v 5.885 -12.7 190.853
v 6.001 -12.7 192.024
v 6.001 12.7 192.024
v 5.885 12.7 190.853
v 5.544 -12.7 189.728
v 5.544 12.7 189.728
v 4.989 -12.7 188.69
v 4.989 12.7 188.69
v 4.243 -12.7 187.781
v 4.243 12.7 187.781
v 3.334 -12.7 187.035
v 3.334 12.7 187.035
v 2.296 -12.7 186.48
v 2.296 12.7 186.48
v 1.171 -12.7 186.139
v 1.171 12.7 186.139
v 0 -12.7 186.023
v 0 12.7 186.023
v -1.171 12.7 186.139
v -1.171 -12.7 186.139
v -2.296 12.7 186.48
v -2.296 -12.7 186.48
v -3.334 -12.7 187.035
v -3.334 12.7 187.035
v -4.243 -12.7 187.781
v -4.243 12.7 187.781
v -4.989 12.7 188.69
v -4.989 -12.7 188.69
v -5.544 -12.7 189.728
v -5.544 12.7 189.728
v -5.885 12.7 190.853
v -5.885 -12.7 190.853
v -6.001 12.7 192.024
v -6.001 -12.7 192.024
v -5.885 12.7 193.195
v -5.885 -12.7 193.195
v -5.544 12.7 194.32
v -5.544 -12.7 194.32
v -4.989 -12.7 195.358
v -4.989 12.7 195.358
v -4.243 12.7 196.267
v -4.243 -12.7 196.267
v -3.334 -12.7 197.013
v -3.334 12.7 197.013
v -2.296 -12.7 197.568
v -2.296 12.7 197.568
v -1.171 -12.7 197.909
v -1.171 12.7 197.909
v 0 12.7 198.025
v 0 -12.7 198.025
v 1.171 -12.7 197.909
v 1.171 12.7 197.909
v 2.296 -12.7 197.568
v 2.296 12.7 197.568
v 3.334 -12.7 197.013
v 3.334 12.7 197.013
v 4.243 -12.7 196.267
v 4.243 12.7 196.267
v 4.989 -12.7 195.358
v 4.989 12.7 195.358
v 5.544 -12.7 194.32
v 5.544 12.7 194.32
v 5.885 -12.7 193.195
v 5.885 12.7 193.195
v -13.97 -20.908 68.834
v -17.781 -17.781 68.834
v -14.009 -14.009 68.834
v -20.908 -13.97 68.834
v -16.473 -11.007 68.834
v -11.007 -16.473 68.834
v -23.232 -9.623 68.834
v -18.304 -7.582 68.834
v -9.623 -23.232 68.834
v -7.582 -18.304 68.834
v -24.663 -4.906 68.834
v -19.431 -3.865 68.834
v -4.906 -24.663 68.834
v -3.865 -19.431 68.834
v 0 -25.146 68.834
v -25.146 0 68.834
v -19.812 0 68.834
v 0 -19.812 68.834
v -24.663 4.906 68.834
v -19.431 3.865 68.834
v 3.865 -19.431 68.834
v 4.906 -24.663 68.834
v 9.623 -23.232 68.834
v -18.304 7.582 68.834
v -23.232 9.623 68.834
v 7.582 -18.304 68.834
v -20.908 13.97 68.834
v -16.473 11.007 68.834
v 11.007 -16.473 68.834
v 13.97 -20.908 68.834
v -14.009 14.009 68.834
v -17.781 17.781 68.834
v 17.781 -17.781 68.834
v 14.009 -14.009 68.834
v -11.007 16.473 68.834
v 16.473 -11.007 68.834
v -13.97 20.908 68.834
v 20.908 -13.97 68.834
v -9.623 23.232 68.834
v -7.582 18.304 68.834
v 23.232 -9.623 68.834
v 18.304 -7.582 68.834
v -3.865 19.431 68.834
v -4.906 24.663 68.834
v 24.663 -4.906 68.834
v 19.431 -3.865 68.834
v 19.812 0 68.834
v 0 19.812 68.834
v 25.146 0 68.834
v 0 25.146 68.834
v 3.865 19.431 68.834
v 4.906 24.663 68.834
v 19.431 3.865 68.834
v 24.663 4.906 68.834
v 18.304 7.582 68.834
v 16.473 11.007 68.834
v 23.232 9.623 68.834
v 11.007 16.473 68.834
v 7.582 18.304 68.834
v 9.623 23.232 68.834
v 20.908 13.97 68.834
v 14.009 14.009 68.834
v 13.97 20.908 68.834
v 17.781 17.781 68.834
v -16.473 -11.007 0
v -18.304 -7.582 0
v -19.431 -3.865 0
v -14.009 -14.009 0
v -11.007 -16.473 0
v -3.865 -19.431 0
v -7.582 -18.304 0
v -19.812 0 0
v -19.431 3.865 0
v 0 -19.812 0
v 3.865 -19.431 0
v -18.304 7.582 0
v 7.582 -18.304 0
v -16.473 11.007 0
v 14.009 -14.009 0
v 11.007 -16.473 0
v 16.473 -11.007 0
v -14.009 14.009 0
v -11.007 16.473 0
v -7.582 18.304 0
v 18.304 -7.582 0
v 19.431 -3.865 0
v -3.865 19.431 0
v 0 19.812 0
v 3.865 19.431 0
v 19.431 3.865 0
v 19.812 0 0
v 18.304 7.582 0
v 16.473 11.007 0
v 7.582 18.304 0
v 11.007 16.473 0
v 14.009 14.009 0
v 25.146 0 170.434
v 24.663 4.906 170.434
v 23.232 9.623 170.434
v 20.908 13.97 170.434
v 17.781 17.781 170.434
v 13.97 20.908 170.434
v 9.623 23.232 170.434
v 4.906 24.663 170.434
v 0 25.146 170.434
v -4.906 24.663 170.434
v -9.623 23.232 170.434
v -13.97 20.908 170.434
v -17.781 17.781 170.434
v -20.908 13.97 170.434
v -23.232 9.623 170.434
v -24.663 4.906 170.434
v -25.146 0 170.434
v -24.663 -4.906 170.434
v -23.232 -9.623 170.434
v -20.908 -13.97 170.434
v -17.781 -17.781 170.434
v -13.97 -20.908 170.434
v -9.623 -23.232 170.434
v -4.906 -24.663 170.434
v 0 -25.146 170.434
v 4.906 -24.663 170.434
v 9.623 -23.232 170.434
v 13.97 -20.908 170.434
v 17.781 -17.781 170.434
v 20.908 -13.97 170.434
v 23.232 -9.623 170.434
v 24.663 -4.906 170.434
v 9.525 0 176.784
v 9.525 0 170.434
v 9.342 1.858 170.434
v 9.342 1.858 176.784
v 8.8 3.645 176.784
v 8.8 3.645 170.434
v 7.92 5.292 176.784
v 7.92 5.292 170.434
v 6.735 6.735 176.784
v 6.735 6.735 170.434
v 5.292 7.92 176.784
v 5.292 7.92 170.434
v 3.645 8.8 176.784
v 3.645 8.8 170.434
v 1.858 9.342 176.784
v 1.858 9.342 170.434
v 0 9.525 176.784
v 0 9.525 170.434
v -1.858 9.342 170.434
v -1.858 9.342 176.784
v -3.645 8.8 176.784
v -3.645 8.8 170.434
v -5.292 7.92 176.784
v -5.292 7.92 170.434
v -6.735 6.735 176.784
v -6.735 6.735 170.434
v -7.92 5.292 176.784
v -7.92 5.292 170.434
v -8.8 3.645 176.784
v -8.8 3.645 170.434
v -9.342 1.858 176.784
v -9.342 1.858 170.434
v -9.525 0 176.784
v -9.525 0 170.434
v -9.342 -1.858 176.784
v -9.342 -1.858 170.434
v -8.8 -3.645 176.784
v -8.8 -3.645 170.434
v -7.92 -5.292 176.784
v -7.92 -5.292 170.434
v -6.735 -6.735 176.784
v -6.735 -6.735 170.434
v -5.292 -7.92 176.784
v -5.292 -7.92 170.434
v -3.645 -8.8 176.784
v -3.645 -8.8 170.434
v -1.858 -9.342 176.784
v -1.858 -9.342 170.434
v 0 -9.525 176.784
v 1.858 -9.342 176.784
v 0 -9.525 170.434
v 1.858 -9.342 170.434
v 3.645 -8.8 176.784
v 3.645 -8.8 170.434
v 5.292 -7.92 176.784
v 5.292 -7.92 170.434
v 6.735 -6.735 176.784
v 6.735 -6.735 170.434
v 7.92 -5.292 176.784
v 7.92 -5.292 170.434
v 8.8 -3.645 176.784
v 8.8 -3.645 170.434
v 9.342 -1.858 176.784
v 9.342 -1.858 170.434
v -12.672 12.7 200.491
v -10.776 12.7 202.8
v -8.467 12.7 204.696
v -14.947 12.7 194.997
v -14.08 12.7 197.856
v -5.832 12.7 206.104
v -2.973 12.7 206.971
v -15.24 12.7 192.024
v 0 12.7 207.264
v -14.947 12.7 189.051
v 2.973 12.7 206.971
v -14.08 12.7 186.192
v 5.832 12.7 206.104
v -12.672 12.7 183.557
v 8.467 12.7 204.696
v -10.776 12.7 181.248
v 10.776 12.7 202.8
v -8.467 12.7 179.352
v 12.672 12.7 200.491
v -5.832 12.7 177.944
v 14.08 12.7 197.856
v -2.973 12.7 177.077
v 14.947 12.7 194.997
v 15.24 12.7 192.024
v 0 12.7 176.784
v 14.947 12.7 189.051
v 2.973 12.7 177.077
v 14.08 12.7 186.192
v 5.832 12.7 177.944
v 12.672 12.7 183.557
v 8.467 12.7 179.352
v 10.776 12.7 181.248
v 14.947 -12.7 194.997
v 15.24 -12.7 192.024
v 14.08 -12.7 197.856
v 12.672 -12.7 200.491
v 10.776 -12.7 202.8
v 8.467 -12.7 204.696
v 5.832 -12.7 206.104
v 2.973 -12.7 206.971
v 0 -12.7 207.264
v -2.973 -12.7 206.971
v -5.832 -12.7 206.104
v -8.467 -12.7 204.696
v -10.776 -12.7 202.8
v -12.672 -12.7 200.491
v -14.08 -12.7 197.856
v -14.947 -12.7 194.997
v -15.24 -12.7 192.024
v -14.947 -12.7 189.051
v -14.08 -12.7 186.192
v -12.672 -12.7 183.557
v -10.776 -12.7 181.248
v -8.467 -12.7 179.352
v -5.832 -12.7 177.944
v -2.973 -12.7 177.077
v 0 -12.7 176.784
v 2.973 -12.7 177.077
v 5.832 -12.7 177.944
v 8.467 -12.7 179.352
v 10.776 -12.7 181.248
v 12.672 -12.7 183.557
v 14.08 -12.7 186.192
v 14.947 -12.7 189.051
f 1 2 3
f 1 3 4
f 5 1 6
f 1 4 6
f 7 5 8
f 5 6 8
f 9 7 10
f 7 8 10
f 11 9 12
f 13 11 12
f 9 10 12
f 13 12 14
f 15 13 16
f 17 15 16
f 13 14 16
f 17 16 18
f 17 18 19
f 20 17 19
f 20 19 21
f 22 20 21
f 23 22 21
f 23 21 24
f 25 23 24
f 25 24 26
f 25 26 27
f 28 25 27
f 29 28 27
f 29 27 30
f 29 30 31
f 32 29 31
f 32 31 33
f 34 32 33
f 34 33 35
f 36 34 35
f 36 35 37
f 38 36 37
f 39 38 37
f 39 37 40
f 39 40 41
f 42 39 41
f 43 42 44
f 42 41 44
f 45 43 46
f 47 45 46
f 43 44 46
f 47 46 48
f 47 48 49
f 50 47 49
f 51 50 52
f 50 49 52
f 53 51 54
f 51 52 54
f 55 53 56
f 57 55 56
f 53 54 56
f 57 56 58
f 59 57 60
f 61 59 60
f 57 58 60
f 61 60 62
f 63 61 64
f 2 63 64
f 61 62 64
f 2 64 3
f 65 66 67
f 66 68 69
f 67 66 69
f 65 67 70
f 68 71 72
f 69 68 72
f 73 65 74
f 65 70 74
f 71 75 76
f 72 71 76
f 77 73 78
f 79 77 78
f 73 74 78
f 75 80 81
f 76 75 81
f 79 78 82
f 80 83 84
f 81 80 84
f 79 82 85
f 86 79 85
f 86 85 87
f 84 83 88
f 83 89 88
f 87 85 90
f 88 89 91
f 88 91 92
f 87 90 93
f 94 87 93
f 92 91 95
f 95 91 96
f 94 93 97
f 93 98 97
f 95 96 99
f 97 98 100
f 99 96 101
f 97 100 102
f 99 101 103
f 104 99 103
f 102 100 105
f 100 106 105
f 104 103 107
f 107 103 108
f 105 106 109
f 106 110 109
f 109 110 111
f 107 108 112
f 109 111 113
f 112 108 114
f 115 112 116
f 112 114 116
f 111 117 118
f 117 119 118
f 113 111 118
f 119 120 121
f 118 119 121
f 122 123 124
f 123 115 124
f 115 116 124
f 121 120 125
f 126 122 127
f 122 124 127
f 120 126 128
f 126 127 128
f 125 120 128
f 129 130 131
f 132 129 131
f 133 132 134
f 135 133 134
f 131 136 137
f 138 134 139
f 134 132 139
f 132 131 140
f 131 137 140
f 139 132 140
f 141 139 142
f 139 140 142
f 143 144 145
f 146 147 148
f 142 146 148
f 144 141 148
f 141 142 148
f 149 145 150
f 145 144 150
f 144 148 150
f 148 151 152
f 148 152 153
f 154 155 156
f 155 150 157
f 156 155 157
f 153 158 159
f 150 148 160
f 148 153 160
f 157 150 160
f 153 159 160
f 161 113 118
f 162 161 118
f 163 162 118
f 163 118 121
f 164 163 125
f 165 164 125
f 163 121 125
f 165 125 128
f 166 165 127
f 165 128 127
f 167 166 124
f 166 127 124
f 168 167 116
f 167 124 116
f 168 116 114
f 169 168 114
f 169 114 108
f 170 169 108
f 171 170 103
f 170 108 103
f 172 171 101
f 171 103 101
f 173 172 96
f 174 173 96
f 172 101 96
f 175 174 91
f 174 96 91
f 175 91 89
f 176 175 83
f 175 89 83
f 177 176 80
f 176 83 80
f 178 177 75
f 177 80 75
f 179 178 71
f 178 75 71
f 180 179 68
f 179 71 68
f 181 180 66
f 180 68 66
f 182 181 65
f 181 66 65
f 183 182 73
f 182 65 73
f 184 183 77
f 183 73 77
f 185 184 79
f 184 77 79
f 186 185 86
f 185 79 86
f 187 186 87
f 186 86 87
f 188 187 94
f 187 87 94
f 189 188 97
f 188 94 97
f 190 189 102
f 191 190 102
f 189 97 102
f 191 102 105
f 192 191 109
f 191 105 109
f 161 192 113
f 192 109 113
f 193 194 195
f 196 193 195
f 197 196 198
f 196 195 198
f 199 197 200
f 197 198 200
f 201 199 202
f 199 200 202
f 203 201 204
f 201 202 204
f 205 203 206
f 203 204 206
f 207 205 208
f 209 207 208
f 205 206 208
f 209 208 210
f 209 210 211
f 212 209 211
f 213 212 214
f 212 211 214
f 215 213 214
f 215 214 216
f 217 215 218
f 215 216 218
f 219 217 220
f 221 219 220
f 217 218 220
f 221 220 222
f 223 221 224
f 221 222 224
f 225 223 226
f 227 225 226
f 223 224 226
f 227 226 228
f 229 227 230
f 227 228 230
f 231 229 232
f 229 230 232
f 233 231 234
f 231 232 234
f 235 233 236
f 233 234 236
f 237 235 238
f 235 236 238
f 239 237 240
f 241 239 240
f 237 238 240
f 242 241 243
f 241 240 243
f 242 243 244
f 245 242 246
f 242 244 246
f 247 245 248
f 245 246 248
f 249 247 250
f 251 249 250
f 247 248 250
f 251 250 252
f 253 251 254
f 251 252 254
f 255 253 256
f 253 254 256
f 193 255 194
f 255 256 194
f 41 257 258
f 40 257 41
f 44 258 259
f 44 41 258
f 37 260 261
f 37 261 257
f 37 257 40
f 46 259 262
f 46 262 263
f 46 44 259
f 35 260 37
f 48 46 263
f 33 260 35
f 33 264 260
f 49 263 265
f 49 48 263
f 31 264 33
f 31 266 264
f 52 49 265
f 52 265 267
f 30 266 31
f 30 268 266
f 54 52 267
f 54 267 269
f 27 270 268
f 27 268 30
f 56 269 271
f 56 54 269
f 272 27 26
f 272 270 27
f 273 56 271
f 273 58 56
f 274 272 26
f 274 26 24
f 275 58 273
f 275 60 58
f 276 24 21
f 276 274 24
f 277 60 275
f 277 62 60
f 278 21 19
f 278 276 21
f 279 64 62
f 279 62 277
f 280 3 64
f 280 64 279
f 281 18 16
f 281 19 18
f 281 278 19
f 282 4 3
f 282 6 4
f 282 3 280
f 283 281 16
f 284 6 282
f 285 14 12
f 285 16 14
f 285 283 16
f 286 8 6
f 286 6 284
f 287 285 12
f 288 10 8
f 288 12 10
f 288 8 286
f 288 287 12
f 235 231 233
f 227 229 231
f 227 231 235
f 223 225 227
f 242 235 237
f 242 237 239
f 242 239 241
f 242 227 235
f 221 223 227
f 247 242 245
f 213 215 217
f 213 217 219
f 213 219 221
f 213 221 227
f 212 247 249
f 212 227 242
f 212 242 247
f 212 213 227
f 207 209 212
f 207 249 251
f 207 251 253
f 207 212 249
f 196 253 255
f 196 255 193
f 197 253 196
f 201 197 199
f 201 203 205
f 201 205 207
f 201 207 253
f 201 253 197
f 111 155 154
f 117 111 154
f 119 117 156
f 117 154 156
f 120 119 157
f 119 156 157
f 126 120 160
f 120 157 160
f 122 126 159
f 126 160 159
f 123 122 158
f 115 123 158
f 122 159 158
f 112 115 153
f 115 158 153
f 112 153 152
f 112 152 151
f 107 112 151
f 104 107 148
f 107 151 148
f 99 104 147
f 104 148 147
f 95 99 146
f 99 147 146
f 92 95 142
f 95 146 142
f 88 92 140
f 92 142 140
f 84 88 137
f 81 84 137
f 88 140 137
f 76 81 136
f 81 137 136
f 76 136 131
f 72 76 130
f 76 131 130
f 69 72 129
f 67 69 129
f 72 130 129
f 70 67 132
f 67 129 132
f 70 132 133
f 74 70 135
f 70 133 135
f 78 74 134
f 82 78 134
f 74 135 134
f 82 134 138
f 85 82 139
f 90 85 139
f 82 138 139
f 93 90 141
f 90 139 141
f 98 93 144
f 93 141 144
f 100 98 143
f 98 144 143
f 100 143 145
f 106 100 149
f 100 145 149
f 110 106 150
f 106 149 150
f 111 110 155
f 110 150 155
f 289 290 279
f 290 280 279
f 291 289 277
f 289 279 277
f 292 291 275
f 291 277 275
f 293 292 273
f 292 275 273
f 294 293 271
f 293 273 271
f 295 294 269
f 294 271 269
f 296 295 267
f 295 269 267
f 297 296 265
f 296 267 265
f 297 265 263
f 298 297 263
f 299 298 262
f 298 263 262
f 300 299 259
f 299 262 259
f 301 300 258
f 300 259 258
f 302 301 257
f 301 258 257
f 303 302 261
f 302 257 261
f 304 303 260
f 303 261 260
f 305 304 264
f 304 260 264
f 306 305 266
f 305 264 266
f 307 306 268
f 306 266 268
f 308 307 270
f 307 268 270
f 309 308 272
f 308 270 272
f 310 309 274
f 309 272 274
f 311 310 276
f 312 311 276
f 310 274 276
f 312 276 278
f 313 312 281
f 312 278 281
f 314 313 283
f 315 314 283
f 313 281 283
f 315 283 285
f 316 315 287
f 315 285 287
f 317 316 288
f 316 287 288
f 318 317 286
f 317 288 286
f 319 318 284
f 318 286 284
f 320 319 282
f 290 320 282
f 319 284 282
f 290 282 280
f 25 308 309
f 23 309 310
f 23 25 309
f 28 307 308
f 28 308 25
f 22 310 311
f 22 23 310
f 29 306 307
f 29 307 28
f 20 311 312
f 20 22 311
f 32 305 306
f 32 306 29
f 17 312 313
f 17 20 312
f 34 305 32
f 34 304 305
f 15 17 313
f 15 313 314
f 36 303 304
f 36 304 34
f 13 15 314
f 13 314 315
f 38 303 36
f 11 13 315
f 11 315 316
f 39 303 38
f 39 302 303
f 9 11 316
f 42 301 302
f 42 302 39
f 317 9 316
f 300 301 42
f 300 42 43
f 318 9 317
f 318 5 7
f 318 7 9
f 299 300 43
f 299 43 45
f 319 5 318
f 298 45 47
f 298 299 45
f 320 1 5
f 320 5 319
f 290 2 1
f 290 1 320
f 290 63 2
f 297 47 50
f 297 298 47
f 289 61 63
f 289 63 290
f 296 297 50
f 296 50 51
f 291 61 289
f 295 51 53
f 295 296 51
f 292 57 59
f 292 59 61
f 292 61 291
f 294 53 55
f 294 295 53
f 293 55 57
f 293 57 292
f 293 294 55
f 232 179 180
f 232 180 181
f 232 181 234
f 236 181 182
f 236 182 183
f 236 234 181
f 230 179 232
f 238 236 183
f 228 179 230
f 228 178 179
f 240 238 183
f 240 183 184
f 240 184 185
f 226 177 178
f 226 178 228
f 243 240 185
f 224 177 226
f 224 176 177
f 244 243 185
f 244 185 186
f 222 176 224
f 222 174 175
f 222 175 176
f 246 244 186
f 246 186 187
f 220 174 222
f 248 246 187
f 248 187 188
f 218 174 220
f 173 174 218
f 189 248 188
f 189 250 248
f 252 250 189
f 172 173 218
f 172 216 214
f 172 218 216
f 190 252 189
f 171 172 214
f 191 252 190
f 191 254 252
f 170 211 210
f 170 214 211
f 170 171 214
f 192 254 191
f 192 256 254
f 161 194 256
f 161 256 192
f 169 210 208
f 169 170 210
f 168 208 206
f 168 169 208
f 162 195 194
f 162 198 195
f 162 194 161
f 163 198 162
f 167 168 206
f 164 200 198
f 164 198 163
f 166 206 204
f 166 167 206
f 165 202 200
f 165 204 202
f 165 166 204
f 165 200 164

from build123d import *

# Parameters (mm, degrees)
SKETCH1_R           = 19.812
BOSS_EXTRUDE1_DEPTH = 68.834
SKETCH2_R           = 25.146
BOSS_EXTRUDE2_DEPTH = 101.6
SKETCH3_R           = 9.525
BOSS_EXTRUDE3_DEPTH = 6.35
SKETCH5_R           = 15.24
BOSS_EXTRUDE4_DEPTH = 12.7
SKETCH6_R           = 15.24
BOSS_EXTRUDE5_DEPTH = 12.7
SKETCH7_R           = 6.00075
CUT_EXTRUDE1_DEPTH  = 38.846


with BuildPart() as part:
    # Sketch1 → Boss-Extrude1 (new body)
    with BuildSketch(Plane.XY):
        Circle(SKETCH1_R)
    extrude(amount=BOSS_EXTRUDE1_DEPTH)

    # Sketch2 → Boss-Extrude2 (add)
    with BuildSketch(Plane.XY.offset(68.834)):
        Circle(SKETCH2_R)
    extrude(amount=BOSS_EXTRUDE2_DEPTH)

    # Sketch3 → Boss-Extrude3 (add)
    with BuildSketch(Plane.XY.offset(170.434)):
        Circle(SKETCH3_R)
    extrude(amount=BOSS_EXTRUDE3_DEPTH)


with BuildPart() as body_2:
    # Sketch5 → Boss-Extrude4 (new body)
    with BuildSketch(Plane(origin=(0, 0, 0), x_dir=(1, 0, 0), z_dir=(0, 1, 0))):
        with Locations((0, -192.024)):
            Circle(SKETCH5_R)
    extrude(amount=BOSS_EXTRUDE4_DEPTH)

    # Sketch6 → Boss-Extrude5 (add)
    with BuildSketch(Plane.XZ):
        with Locations((0, 192.024)):
            Circle(SKETCH6_R)
    extrude(amount=BOSS_EXTRUDE5_DEPTH)

    # Sketch7 → Cut-Extrude1 (cut, through all)
    with BuildSketch(Plane(origin=(0, 12.7, 0), x_dir=(1, 0, 0), z_dir=(0, 1, 0))):
        with Locations((0, -192.024)):
            Circle(SKETCH7_R)
    extrude(amount=-CUT_EXTRUDE1_DEPTH, mode=Mode.SUBTRACT)


solid = Compound([part.part, body_2.part])
